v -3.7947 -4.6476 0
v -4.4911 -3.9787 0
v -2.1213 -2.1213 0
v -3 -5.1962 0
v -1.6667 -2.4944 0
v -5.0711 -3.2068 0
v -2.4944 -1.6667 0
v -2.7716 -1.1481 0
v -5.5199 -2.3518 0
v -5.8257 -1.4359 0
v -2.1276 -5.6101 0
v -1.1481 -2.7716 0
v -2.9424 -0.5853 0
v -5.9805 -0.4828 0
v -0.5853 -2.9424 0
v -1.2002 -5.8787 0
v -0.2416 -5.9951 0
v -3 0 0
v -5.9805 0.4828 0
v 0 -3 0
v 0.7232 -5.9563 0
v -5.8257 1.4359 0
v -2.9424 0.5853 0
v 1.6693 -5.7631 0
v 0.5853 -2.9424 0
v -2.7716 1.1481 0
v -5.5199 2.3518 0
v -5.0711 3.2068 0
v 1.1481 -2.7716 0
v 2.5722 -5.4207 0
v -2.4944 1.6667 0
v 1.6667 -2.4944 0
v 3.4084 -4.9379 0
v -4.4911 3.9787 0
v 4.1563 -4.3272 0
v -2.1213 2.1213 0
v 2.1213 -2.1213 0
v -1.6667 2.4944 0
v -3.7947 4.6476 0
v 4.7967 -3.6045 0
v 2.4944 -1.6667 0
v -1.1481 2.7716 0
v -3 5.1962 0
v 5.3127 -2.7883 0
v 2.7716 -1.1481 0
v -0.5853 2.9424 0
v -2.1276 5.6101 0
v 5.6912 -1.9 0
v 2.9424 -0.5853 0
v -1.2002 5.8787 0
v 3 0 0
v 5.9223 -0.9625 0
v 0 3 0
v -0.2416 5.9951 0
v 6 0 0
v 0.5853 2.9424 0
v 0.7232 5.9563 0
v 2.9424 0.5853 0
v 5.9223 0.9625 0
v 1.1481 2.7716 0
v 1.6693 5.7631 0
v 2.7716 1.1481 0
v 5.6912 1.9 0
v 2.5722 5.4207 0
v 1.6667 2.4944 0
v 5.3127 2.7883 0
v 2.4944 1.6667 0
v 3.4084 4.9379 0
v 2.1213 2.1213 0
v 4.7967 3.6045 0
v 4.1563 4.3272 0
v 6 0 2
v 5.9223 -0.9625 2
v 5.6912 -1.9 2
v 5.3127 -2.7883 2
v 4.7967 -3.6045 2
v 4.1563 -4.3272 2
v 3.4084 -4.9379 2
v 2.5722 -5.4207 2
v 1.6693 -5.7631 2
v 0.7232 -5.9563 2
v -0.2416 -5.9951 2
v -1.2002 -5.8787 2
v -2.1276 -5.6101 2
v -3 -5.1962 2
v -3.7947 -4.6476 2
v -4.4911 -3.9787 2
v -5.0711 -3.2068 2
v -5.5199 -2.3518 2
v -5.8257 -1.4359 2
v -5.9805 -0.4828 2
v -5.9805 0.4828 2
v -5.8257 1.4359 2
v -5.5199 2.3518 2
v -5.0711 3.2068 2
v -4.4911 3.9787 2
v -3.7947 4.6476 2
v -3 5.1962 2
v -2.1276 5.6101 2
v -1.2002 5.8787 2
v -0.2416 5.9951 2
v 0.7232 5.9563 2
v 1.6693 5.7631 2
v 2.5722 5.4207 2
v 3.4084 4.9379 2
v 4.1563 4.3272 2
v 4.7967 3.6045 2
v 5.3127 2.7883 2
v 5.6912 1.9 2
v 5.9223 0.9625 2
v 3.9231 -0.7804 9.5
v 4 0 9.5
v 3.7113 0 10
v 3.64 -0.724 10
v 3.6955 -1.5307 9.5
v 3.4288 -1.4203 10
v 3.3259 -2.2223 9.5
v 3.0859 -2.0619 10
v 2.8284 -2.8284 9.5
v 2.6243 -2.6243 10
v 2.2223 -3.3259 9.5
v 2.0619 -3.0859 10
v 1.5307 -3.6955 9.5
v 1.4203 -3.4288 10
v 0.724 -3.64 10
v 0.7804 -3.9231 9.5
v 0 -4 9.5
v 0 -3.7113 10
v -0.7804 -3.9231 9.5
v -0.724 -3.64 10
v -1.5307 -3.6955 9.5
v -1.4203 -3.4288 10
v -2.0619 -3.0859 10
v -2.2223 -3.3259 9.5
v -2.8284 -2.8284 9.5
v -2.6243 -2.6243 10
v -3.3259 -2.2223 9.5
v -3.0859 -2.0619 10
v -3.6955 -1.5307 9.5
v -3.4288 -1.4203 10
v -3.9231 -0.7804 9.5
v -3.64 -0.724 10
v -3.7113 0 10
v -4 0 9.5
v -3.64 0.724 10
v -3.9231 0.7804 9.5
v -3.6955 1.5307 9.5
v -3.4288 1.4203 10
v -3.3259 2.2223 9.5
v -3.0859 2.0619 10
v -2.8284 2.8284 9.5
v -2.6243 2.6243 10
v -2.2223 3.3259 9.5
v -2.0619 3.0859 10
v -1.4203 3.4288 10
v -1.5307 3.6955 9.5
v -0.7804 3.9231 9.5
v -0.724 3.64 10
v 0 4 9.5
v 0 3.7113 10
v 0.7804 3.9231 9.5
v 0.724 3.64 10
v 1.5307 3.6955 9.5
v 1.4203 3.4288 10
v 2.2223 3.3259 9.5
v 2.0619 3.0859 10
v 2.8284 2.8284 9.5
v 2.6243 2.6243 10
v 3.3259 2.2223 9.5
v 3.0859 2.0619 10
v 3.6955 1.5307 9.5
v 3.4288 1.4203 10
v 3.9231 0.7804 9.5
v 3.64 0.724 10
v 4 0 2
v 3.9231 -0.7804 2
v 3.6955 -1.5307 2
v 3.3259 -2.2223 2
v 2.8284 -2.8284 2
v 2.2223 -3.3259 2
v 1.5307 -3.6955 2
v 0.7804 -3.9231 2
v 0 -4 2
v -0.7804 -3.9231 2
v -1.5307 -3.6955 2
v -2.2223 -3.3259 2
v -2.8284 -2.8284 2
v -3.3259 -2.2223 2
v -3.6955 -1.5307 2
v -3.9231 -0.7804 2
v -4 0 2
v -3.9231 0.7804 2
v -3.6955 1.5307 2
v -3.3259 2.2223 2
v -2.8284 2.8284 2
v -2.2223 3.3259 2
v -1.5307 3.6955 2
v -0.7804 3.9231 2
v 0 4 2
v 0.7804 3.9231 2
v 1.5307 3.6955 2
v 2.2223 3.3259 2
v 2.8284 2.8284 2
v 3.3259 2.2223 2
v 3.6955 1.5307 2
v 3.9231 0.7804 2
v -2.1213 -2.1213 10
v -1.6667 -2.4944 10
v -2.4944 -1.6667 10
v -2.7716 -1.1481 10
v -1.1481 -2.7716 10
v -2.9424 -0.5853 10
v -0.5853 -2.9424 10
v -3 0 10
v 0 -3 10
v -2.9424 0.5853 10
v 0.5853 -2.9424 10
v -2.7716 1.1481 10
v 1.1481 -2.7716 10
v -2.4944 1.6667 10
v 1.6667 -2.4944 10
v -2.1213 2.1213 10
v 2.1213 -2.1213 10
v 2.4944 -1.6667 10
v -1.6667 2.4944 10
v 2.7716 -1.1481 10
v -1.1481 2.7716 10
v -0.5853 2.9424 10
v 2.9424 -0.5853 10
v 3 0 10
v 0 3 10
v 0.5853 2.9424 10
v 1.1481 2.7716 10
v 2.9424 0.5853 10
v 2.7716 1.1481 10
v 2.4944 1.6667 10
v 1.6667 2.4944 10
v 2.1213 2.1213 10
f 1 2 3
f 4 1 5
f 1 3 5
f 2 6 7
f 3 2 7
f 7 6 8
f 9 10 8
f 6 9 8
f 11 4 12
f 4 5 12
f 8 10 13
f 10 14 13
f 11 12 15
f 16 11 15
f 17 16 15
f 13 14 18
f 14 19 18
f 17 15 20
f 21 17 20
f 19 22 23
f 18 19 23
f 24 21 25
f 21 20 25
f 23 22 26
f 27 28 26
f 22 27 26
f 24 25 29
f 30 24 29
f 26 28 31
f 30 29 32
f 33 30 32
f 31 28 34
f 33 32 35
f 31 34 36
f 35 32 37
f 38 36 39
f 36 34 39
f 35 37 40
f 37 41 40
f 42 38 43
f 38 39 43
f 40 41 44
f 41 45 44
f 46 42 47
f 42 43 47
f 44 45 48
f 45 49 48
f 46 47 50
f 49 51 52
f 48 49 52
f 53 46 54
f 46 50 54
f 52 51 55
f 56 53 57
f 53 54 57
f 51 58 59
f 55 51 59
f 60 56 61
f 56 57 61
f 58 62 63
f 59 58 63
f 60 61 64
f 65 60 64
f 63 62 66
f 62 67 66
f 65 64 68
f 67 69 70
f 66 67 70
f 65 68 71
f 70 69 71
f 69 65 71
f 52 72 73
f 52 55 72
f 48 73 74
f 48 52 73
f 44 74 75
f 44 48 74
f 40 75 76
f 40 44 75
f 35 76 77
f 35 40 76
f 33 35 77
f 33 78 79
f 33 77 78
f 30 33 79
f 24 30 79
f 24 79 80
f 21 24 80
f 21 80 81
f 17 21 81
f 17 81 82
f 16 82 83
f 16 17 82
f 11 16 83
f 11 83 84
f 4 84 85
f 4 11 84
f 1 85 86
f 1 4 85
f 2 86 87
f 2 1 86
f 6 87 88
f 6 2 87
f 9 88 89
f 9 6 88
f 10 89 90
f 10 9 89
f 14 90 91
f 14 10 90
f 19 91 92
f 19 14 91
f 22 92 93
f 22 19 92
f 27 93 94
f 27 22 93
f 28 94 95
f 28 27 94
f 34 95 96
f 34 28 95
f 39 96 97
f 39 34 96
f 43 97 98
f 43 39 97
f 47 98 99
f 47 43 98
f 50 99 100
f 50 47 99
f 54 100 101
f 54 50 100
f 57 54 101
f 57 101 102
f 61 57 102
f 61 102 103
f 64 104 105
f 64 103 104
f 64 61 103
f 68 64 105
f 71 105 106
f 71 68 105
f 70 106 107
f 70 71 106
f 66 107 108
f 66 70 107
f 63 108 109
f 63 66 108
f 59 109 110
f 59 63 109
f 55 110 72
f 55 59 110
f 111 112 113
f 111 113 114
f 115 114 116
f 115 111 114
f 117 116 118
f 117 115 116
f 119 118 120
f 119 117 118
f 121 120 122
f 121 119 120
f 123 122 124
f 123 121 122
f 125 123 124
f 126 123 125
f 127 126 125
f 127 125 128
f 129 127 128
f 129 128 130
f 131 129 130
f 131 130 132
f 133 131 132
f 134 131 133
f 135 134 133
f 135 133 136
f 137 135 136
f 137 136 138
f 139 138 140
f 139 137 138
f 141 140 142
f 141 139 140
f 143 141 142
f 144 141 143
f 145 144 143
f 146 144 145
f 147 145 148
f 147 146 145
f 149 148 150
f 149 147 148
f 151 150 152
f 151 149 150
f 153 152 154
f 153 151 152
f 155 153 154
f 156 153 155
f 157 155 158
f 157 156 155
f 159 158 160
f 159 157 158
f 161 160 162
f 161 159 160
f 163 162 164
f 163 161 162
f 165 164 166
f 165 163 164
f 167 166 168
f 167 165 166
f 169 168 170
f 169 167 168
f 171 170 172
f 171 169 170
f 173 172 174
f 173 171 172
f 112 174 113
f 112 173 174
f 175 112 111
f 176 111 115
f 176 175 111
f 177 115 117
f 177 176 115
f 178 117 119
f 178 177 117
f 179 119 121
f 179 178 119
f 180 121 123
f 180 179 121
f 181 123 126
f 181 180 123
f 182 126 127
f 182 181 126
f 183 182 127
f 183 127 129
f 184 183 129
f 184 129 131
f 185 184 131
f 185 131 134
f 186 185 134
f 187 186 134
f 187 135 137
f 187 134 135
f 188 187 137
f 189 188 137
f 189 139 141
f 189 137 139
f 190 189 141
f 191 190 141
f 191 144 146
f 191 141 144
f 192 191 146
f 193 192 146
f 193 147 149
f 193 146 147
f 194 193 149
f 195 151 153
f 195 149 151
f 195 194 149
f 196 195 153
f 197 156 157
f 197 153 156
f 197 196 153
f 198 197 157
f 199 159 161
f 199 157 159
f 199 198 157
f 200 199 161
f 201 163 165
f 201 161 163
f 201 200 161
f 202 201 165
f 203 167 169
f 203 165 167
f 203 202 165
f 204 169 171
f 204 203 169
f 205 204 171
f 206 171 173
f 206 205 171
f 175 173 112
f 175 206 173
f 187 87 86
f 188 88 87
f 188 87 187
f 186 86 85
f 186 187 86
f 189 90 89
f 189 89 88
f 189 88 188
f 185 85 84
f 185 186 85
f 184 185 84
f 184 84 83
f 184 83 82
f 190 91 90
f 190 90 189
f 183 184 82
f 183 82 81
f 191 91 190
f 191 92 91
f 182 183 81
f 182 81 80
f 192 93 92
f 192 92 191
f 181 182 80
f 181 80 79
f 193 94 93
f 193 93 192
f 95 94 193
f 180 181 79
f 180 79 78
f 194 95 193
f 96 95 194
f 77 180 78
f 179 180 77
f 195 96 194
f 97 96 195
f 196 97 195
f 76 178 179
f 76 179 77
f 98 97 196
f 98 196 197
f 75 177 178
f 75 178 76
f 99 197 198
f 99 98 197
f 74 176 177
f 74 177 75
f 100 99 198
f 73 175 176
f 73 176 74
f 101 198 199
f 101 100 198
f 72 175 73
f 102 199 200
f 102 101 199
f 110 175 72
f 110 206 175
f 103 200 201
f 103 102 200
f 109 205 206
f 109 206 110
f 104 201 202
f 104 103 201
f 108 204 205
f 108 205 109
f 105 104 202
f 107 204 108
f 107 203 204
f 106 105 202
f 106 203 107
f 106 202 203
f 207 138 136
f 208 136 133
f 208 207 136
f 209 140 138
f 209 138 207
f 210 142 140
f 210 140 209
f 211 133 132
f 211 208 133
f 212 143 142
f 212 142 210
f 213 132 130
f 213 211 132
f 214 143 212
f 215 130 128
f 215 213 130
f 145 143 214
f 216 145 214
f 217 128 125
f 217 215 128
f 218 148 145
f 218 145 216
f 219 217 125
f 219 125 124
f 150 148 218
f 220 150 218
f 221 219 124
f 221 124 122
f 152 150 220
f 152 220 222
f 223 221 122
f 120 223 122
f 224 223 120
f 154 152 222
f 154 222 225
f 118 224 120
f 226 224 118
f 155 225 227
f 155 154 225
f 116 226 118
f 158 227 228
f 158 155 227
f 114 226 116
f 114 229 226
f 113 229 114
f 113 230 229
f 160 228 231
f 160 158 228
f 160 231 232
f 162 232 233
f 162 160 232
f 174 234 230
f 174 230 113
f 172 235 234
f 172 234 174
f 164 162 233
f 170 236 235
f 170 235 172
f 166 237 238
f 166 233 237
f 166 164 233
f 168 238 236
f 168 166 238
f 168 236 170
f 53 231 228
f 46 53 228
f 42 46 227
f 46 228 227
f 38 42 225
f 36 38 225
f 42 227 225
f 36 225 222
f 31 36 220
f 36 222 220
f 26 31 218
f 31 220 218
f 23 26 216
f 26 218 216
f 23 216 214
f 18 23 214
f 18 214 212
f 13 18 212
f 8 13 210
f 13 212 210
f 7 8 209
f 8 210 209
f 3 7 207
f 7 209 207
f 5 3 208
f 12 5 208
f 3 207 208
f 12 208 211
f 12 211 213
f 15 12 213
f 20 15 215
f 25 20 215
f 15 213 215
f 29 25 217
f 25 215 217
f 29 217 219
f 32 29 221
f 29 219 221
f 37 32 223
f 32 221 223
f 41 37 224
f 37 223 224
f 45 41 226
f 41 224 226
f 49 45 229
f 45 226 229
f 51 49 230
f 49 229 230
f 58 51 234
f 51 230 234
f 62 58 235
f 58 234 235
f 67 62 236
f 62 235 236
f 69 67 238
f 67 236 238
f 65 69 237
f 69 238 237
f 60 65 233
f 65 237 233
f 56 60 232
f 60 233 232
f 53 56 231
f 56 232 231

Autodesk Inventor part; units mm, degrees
ref_plane "YZ Plane" through (0, 0, 0) normal (1, 0, 0) x (0, 1, 0)
ref_plane "XZ Plane" through (0, 0, 0) normal (0, 1, 0) x (-1, 0, 0)
ref_plane "XY Plane" through (0, 0, 0) normal (0, 0, 1) x (1, 0, 0)
sketch "Sketch1" plane through (0, 0, 0) normal (0, 0, 1) x (1, 0, 0)
  circle A0 centre (0, 0) radius 6
  circle A1 centre (0, 0) radius 3 construction
  circle A2 centre (0, 0) radius 4
  dimension "dia_Flange" = 12
  dimension "dia_Shaft" = 6
  dimension "dia_Outer" = 8
extrude "Extrusion1" add sketch "Sketch1" along normal blind 2 contours A0 | A2
extrude "Extrusion2" add sketch "Sketch1" along normal blind 10 contours A2
chamfer "Chamfer1" distance 0.5 angle 30 1 edges at (-4, 0, 10) measured on face at (3.9482, 0.6416, 4.6667)
hole "Hole1" at (0, 0, 0) direction (0, 0, 1) diameter 6 end through all
equation "\"d10\" = dia_Shaft"
properties part number "GFM-0608-10_Brass" material "Brass"
